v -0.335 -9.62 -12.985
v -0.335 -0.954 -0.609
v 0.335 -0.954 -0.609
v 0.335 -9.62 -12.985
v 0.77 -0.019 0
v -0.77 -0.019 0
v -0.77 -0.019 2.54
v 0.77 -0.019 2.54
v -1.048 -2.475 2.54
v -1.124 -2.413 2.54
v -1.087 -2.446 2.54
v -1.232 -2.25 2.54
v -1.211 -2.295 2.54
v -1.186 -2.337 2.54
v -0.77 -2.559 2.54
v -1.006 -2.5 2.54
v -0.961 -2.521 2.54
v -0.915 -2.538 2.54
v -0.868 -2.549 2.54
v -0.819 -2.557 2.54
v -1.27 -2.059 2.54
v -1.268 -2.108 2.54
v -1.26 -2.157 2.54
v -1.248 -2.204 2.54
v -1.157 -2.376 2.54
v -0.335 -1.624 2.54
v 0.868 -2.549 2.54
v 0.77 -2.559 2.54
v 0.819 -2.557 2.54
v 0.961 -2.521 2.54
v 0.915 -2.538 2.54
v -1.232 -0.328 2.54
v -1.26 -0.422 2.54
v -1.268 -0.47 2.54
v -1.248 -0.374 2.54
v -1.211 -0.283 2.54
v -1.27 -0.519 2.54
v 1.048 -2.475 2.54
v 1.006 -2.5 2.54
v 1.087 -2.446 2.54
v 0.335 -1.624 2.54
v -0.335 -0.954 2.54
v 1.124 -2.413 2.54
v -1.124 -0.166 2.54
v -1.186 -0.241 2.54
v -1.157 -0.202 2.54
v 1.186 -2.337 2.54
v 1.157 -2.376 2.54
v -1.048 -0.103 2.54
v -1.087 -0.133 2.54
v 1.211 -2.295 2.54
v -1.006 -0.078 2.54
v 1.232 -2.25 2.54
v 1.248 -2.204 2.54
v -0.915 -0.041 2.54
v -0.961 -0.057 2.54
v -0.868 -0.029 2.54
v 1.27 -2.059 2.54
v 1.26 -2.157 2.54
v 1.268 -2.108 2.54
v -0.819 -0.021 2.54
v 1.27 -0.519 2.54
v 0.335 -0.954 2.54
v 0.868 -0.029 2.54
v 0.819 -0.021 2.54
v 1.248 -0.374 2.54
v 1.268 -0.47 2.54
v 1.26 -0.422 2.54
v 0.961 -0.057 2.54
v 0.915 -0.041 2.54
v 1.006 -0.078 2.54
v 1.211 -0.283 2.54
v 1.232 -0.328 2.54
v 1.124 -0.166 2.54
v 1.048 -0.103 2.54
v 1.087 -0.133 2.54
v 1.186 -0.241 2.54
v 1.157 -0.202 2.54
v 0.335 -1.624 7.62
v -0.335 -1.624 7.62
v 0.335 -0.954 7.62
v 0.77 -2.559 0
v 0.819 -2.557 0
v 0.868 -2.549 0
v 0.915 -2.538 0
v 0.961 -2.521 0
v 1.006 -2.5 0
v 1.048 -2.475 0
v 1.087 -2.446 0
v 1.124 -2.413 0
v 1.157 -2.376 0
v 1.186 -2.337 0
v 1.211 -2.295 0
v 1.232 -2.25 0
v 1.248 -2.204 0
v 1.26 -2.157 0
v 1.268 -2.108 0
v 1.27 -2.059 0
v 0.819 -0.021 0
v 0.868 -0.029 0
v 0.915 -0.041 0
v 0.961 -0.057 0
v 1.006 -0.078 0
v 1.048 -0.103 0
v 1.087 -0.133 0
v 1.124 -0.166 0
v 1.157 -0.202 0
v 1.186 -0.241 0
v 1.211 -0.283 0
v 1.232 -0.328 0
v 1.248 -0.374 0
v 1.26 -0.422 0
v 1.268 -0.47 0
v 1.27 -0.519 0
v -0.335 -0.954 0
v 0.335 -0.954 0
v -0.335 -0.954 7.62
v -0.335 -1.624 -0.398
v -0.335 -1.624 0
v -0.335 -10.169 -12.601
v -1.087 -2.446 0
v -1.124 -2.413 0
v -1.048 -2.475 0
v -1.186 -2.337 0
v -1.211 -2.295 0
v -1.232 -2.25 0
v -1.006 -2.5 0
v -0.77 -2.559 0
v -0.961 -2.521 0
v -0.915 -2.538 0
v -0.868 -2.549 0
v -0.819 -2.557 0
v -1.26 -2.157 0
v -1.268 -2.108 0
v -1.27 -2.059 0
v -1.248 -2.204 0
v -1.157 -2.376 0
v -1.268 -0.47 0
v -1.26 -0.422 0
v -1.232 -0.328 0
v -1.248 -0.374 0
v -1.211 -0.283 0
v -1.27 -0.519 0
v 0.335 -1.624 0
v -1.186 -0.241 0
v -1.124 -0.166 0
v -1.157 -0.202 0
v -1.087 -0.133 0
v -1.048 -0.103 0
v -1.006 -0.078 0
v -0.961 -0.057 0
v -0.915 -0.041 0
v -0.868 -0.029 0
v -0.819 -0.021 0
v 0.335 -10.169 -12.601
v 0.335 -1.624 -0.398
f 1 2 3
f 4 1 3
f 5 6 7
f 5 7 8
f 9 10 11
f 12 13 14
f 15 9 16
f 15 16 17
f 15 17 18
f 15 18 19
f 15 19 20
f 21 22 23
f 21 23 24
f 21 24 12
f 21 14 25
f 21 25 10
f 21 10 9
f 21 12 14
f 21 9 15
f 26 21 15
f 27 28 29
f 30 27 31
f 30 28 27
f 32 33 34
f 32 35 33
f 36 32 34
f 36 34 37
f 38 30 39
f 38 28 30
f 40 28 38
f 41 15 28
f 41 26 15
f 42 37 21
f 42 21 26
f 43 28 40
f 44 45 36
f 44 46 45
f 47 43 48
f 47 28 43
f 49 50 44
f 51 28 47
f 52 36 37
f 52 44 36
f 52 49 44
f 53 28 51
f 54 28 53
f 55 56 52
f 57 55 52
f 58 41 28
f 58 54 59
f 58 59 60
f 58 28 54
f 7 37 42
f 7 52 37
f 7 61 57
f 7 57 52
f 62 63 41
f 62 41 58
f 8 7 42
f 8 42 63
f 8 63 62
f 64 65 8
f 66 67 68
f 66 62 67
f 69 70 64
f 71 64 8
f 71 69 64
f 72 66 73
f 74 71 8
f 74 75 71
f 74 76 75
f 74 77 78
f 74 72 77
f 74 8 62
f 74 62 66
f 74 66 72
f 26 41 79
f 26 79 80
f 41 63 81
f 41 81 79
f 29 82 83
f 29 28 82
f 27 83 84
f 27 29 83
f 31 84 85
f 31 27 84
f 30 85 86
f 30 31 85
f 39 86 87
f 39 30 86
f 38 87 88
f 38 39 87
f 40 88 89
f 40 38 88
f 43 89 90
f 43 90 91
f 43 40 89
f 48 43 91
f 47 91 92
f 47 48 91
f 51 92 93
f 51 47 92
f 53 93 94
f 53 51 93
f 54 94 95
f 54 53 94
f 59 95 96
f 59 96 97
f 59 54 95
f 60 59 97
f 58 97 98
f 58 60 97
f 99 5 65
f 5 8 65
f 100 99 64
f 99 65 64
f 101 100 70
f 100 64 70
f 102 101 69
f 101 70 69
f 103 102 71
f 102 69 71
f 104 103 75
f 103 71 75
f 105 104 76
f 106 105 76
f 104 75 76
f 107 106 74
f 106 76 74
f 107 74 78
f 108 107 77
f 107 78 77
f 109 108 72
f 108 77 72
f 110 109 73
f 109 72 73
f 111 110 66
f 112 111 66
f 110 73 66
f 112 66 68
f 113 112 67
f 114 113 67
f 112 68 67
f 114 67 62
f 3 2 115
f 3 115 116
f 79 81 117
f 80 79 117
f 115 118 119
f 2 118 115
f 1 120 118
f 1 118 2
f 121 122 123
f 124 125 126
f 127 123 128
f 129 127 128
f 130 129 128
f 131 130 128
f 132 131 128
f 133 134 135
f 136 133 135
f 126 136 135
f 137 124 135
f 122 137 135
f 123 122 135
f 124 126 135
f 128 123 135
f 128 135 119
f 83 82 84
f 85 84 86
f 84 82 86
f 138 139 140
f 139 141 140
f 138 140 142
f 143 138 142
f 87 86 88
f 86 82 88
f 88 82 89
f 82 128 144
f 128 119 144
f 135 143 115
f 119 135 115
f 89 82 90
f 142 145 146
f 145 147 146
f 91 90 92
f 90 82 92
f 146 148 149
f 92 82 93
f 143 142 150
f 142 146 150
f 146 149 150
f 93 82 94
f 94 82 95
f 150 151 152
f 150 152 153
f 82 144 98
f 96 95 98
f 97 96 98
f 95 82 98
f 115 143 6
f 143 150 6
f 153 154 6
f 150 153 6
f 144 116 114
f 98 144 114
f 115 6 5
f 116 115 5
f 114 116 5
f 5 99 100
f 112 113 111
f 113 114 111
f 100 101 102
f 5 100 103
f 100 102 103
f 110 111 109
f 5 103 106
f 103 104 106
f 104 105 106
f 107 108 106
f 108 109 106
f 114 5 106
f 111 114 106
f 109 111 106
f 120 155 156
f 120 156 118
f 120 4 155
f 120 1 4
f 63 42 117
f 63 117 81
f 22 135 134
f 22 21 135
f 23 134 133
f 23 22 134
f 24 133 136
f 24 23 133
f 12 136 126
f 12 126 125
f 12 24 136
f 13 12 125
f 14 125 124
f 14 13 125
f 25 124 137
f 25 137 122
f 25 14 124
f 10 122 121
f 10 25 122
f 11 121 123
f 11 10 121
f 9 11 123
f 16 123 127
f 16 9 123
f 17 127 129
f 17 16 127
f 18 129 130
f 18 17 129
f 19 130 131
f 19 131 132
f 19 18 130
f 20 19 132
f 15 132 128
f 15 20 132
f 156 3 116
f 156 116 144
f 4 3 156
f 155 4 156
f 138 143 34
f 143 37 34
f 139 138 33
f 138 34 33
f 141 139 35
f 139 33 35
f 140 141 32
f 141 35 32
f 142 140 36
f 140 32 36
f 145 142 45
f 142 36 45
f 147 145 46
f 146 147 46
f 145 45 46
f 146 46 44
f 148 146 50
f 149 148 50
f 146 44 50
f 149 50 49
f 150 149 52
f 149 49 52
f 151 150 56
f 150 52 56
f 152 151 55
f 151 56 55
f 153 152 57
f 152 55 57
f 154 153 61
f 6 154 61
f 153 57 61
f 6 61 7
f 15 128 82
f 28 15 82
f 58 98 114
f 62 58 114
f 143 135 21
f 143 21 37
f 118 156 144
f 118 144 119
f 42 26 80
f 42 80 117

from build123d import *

# Parameters (mm, degrees)
SKETCH_1_W      = 2.54
SKETCH_1_H      = 2.54
EXTRUDE_1_DEPTH = 2.54
SKETCH_2_W      = 0.67
SKETCH_2_H      = 0.67
FILLET_1_R      = 0.5


with BuildPart() as part:
    # 草图1 → 拉伸1 (new body)
    with BuildSketch(Plane.XY):
        with Locations((0, -1.289090726)):
            Rectangle(SKETCH_1_W, SKETCH_1_H)
    extrude(amount=EXTRUDE_1_DEPTH)

    # 扫描1: sweep along a path in 草图3
    with BuildLine(Plane(origin=(0, 0, 0), x_dir=(0, 0, -1), z_dir=(1, 0, 0))) as sweep_1_path:
        Line((-7.62, -1.299090726), (0.5, -1.299090726))
        Line((0.5, -1.299090726), (12.787280664, -9.902737271))
    # 草图2 → 扫描1 (sweep)
    with BuildSketch(Plane(origin=(0, 0, 7.62), x_dir=(-1, 0, 0), z_dir=(0, 0, -1))):
        with Locations((0, -1.289090726)):
            Rectangle(SKETCH_2_W, SKETCH_2_H)
    sweep(path=sweep_1_path.line, transition=Transition.RIGHT)

    # 圆角1
    fillet_1_edges = [part.edges().sort_by_distance(p)[0] for p in [
        (-1.27, -0.019090726, 1.27),
        (1.27, -0.019090726, 1.27),
        (1.27, -2.559090726, 1.27),
        (-1.27, -2.559090726, 1.27),
    ]]
    fillet(fillet_1_edges, radius=FILLET_1_R)


solid = part.part
